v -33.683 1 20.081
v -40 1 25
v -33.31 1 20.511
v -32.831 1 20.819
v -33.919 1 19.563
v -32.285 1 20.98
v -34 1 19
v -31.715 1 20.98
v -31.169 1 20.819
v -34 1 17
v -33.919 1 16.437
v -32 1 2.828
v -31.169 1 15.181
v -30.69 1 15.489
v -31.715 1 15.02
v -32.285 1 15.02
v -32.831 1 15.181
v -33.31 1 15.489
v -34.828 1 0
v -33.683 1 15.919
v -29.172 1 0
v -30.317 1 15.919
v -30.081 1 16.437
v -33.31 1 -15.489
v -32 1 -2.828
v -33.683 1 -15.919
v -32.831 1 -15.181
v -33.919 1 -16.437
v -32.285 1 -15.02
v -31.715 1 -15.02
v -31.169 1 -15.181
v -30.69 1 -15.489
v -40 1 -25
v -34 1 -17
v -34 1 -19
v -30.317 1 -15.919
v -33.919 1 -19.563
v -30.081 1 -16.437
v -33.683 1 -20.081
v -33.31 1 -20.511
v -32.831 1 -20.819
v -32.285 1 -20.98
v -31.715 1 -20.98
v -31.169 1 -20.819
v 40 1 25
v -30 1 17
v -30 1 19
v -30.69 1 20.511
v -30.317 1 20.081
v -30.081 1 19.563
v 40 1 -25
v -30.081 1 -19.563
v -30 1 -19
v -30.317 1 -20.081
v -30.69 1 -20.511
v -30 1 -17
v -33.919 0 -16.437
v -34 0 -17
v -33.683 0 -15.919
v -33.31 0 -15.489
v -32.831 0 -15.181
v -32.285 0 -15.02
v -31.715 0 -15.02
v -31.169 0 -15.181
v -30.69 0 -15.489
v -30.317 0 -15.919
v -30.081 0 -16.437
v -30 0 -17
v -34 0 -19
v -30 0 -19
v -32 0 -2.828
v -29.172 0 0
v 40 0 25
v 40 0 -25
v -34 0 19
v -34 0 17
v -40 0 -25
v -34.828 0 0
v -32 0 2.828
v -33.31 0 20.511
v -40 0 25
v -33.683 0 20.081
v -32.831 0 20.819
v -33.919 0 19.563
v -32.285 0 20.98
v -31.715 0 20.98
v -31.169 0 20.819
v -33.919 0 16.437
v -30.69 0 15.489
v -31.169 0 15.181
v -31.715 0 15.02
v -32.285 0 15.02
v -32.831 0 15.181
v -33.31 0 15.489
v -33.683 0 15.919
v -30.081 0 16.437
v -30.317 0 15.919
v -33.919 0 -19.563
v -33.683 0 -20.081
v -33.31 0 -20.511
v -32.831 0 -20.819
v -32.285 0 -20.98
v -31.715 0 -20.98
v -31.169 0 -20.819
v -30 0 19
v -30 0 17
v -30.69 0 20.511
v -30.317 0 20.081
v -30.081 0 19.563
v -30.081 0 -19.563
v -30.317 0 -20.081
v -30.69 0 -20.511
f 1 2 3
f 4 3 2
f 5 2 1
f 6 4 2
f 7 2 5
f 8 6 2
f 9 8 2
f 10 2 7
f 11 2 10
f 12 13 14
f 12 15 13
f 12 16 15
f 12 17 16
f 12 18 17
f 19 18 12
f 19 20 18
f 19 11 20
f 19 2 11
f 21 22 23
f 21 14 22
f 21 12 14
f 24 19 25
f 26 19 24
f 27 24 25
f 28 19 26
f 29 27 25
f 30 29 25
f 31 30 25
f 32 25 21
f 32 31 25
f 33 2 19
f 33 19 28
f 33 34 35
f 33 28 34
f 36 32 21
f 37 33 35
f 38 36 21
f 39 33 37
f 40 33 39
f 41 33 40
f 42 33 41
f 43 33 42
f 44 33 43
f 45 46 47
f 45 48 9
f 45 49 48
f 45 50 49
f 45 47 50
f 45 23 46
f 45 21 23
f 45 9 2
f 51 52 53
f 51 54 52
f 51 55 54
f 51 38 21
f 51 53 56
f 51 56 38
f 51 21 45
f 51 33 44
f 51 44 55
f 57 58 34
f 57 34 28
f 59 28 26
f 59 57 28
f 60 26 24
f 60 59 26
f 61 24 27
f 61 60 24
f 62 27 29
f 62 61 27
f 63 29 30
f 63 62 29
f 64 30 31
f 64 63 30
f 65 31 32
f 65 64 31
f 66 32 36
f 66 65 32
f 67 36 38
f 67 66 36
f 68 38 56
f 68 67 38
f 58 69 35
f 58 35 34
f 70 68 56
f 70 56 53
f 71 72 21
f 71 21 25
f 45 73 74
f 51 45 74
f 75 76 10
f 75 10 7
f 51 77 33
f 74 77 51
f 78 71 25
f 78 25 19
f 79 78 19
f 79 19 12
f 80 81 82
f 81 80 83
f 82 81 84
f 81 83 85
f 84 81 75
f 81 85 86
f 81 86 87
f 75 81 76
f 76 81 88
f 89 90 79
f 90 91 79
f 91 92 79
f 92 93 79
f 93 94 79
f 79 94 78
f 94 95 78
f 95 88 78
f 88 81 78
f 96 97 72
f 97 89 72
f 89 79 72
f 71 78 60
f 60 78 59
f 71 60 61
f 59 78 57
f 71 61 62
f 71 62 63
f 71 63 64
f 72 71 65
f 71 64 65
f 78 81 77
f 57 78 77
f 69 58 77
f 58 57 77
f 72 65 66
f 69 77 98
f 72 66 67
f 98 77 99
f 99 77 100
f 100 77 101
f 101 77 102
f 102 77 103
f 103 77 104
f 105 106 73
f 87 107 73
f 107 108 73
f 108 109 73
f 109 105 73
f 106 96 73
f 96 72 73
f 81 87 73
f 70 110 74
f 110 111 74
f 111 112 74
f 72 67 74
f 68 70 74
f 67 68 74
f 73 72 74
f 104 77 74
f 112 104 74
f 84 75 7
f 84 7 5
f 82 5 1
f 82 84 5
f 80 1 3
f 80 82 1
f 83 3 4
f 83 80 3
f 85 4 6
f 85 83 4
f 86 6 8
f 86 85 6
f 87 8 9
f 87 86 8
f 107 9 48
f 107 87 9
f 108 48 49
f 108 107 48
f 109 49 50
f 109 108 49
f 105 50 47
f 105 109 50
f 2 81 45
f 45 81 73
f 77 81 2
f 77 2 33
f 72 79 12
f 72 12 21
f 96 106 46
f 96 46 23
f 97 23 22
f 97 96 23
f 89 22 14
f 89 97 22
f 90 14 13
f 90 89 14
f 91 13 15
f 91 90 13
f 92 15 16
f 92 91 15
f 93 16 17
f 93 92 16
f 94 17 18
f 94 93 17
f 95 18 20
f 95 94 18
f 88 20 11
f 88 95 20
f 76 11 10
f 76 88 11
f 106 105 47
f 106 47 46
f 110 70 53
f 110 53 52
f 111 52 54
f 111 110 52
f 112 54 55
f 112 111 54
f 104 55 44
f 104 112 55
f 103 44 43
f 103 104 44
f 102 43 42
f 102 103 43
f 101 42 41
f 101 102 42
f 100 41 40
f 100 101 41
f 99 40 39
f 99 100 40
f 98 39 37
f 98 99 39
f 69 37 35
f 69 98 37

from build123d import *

# Parameters (mm, degrees)
SKETCH_1_W      = 80
SKETCH_1_H      = 50
EXTRUDE_2_DEPTH = 1


with BuildPart() as part:
    # Эскиз1 → Бобышка-Вытянуть2 (new body)
    with BuildSketch(Plane(origin=(0, 0, 0), x_dir=(1, 0, 0), z_dir=(0, 1, 0))):
        Rectangle(SKETCH_1_W, SKETCH_1_H)
        Polygon((-34.828427125, 0), (-32, -2.828427125), (-29.171572875, 0), (-32, 2.828427125), align=None, mode=Mode.SUBTRACT)
        with BuildLine():
            Line((-30, -19), (-30, -17))
            ThreePointArc((-30, -17), (-32, -15), (-34, -17))
            Line((-34, -17), (-34, -19))
            ThreePointArc((-34, -19), (-32, -21), (-30, -19))
        make_face(mode=Mode.SUBTRACT)
        with BuildLine():
            Line((-34, 19), (-34, 17))
            ThreePointArc((-34, 17), (-32, 15), (-30, 17))
            Line((-30, 17), (-30, 19))
            ThreePointArc((-30, 19), (-32, 21), (-34, 19))
        make_face(mode=Mode.SUBTRACT)
    extrude(amount=EXTRUDE_2_DEPTH)


solid = part.part
